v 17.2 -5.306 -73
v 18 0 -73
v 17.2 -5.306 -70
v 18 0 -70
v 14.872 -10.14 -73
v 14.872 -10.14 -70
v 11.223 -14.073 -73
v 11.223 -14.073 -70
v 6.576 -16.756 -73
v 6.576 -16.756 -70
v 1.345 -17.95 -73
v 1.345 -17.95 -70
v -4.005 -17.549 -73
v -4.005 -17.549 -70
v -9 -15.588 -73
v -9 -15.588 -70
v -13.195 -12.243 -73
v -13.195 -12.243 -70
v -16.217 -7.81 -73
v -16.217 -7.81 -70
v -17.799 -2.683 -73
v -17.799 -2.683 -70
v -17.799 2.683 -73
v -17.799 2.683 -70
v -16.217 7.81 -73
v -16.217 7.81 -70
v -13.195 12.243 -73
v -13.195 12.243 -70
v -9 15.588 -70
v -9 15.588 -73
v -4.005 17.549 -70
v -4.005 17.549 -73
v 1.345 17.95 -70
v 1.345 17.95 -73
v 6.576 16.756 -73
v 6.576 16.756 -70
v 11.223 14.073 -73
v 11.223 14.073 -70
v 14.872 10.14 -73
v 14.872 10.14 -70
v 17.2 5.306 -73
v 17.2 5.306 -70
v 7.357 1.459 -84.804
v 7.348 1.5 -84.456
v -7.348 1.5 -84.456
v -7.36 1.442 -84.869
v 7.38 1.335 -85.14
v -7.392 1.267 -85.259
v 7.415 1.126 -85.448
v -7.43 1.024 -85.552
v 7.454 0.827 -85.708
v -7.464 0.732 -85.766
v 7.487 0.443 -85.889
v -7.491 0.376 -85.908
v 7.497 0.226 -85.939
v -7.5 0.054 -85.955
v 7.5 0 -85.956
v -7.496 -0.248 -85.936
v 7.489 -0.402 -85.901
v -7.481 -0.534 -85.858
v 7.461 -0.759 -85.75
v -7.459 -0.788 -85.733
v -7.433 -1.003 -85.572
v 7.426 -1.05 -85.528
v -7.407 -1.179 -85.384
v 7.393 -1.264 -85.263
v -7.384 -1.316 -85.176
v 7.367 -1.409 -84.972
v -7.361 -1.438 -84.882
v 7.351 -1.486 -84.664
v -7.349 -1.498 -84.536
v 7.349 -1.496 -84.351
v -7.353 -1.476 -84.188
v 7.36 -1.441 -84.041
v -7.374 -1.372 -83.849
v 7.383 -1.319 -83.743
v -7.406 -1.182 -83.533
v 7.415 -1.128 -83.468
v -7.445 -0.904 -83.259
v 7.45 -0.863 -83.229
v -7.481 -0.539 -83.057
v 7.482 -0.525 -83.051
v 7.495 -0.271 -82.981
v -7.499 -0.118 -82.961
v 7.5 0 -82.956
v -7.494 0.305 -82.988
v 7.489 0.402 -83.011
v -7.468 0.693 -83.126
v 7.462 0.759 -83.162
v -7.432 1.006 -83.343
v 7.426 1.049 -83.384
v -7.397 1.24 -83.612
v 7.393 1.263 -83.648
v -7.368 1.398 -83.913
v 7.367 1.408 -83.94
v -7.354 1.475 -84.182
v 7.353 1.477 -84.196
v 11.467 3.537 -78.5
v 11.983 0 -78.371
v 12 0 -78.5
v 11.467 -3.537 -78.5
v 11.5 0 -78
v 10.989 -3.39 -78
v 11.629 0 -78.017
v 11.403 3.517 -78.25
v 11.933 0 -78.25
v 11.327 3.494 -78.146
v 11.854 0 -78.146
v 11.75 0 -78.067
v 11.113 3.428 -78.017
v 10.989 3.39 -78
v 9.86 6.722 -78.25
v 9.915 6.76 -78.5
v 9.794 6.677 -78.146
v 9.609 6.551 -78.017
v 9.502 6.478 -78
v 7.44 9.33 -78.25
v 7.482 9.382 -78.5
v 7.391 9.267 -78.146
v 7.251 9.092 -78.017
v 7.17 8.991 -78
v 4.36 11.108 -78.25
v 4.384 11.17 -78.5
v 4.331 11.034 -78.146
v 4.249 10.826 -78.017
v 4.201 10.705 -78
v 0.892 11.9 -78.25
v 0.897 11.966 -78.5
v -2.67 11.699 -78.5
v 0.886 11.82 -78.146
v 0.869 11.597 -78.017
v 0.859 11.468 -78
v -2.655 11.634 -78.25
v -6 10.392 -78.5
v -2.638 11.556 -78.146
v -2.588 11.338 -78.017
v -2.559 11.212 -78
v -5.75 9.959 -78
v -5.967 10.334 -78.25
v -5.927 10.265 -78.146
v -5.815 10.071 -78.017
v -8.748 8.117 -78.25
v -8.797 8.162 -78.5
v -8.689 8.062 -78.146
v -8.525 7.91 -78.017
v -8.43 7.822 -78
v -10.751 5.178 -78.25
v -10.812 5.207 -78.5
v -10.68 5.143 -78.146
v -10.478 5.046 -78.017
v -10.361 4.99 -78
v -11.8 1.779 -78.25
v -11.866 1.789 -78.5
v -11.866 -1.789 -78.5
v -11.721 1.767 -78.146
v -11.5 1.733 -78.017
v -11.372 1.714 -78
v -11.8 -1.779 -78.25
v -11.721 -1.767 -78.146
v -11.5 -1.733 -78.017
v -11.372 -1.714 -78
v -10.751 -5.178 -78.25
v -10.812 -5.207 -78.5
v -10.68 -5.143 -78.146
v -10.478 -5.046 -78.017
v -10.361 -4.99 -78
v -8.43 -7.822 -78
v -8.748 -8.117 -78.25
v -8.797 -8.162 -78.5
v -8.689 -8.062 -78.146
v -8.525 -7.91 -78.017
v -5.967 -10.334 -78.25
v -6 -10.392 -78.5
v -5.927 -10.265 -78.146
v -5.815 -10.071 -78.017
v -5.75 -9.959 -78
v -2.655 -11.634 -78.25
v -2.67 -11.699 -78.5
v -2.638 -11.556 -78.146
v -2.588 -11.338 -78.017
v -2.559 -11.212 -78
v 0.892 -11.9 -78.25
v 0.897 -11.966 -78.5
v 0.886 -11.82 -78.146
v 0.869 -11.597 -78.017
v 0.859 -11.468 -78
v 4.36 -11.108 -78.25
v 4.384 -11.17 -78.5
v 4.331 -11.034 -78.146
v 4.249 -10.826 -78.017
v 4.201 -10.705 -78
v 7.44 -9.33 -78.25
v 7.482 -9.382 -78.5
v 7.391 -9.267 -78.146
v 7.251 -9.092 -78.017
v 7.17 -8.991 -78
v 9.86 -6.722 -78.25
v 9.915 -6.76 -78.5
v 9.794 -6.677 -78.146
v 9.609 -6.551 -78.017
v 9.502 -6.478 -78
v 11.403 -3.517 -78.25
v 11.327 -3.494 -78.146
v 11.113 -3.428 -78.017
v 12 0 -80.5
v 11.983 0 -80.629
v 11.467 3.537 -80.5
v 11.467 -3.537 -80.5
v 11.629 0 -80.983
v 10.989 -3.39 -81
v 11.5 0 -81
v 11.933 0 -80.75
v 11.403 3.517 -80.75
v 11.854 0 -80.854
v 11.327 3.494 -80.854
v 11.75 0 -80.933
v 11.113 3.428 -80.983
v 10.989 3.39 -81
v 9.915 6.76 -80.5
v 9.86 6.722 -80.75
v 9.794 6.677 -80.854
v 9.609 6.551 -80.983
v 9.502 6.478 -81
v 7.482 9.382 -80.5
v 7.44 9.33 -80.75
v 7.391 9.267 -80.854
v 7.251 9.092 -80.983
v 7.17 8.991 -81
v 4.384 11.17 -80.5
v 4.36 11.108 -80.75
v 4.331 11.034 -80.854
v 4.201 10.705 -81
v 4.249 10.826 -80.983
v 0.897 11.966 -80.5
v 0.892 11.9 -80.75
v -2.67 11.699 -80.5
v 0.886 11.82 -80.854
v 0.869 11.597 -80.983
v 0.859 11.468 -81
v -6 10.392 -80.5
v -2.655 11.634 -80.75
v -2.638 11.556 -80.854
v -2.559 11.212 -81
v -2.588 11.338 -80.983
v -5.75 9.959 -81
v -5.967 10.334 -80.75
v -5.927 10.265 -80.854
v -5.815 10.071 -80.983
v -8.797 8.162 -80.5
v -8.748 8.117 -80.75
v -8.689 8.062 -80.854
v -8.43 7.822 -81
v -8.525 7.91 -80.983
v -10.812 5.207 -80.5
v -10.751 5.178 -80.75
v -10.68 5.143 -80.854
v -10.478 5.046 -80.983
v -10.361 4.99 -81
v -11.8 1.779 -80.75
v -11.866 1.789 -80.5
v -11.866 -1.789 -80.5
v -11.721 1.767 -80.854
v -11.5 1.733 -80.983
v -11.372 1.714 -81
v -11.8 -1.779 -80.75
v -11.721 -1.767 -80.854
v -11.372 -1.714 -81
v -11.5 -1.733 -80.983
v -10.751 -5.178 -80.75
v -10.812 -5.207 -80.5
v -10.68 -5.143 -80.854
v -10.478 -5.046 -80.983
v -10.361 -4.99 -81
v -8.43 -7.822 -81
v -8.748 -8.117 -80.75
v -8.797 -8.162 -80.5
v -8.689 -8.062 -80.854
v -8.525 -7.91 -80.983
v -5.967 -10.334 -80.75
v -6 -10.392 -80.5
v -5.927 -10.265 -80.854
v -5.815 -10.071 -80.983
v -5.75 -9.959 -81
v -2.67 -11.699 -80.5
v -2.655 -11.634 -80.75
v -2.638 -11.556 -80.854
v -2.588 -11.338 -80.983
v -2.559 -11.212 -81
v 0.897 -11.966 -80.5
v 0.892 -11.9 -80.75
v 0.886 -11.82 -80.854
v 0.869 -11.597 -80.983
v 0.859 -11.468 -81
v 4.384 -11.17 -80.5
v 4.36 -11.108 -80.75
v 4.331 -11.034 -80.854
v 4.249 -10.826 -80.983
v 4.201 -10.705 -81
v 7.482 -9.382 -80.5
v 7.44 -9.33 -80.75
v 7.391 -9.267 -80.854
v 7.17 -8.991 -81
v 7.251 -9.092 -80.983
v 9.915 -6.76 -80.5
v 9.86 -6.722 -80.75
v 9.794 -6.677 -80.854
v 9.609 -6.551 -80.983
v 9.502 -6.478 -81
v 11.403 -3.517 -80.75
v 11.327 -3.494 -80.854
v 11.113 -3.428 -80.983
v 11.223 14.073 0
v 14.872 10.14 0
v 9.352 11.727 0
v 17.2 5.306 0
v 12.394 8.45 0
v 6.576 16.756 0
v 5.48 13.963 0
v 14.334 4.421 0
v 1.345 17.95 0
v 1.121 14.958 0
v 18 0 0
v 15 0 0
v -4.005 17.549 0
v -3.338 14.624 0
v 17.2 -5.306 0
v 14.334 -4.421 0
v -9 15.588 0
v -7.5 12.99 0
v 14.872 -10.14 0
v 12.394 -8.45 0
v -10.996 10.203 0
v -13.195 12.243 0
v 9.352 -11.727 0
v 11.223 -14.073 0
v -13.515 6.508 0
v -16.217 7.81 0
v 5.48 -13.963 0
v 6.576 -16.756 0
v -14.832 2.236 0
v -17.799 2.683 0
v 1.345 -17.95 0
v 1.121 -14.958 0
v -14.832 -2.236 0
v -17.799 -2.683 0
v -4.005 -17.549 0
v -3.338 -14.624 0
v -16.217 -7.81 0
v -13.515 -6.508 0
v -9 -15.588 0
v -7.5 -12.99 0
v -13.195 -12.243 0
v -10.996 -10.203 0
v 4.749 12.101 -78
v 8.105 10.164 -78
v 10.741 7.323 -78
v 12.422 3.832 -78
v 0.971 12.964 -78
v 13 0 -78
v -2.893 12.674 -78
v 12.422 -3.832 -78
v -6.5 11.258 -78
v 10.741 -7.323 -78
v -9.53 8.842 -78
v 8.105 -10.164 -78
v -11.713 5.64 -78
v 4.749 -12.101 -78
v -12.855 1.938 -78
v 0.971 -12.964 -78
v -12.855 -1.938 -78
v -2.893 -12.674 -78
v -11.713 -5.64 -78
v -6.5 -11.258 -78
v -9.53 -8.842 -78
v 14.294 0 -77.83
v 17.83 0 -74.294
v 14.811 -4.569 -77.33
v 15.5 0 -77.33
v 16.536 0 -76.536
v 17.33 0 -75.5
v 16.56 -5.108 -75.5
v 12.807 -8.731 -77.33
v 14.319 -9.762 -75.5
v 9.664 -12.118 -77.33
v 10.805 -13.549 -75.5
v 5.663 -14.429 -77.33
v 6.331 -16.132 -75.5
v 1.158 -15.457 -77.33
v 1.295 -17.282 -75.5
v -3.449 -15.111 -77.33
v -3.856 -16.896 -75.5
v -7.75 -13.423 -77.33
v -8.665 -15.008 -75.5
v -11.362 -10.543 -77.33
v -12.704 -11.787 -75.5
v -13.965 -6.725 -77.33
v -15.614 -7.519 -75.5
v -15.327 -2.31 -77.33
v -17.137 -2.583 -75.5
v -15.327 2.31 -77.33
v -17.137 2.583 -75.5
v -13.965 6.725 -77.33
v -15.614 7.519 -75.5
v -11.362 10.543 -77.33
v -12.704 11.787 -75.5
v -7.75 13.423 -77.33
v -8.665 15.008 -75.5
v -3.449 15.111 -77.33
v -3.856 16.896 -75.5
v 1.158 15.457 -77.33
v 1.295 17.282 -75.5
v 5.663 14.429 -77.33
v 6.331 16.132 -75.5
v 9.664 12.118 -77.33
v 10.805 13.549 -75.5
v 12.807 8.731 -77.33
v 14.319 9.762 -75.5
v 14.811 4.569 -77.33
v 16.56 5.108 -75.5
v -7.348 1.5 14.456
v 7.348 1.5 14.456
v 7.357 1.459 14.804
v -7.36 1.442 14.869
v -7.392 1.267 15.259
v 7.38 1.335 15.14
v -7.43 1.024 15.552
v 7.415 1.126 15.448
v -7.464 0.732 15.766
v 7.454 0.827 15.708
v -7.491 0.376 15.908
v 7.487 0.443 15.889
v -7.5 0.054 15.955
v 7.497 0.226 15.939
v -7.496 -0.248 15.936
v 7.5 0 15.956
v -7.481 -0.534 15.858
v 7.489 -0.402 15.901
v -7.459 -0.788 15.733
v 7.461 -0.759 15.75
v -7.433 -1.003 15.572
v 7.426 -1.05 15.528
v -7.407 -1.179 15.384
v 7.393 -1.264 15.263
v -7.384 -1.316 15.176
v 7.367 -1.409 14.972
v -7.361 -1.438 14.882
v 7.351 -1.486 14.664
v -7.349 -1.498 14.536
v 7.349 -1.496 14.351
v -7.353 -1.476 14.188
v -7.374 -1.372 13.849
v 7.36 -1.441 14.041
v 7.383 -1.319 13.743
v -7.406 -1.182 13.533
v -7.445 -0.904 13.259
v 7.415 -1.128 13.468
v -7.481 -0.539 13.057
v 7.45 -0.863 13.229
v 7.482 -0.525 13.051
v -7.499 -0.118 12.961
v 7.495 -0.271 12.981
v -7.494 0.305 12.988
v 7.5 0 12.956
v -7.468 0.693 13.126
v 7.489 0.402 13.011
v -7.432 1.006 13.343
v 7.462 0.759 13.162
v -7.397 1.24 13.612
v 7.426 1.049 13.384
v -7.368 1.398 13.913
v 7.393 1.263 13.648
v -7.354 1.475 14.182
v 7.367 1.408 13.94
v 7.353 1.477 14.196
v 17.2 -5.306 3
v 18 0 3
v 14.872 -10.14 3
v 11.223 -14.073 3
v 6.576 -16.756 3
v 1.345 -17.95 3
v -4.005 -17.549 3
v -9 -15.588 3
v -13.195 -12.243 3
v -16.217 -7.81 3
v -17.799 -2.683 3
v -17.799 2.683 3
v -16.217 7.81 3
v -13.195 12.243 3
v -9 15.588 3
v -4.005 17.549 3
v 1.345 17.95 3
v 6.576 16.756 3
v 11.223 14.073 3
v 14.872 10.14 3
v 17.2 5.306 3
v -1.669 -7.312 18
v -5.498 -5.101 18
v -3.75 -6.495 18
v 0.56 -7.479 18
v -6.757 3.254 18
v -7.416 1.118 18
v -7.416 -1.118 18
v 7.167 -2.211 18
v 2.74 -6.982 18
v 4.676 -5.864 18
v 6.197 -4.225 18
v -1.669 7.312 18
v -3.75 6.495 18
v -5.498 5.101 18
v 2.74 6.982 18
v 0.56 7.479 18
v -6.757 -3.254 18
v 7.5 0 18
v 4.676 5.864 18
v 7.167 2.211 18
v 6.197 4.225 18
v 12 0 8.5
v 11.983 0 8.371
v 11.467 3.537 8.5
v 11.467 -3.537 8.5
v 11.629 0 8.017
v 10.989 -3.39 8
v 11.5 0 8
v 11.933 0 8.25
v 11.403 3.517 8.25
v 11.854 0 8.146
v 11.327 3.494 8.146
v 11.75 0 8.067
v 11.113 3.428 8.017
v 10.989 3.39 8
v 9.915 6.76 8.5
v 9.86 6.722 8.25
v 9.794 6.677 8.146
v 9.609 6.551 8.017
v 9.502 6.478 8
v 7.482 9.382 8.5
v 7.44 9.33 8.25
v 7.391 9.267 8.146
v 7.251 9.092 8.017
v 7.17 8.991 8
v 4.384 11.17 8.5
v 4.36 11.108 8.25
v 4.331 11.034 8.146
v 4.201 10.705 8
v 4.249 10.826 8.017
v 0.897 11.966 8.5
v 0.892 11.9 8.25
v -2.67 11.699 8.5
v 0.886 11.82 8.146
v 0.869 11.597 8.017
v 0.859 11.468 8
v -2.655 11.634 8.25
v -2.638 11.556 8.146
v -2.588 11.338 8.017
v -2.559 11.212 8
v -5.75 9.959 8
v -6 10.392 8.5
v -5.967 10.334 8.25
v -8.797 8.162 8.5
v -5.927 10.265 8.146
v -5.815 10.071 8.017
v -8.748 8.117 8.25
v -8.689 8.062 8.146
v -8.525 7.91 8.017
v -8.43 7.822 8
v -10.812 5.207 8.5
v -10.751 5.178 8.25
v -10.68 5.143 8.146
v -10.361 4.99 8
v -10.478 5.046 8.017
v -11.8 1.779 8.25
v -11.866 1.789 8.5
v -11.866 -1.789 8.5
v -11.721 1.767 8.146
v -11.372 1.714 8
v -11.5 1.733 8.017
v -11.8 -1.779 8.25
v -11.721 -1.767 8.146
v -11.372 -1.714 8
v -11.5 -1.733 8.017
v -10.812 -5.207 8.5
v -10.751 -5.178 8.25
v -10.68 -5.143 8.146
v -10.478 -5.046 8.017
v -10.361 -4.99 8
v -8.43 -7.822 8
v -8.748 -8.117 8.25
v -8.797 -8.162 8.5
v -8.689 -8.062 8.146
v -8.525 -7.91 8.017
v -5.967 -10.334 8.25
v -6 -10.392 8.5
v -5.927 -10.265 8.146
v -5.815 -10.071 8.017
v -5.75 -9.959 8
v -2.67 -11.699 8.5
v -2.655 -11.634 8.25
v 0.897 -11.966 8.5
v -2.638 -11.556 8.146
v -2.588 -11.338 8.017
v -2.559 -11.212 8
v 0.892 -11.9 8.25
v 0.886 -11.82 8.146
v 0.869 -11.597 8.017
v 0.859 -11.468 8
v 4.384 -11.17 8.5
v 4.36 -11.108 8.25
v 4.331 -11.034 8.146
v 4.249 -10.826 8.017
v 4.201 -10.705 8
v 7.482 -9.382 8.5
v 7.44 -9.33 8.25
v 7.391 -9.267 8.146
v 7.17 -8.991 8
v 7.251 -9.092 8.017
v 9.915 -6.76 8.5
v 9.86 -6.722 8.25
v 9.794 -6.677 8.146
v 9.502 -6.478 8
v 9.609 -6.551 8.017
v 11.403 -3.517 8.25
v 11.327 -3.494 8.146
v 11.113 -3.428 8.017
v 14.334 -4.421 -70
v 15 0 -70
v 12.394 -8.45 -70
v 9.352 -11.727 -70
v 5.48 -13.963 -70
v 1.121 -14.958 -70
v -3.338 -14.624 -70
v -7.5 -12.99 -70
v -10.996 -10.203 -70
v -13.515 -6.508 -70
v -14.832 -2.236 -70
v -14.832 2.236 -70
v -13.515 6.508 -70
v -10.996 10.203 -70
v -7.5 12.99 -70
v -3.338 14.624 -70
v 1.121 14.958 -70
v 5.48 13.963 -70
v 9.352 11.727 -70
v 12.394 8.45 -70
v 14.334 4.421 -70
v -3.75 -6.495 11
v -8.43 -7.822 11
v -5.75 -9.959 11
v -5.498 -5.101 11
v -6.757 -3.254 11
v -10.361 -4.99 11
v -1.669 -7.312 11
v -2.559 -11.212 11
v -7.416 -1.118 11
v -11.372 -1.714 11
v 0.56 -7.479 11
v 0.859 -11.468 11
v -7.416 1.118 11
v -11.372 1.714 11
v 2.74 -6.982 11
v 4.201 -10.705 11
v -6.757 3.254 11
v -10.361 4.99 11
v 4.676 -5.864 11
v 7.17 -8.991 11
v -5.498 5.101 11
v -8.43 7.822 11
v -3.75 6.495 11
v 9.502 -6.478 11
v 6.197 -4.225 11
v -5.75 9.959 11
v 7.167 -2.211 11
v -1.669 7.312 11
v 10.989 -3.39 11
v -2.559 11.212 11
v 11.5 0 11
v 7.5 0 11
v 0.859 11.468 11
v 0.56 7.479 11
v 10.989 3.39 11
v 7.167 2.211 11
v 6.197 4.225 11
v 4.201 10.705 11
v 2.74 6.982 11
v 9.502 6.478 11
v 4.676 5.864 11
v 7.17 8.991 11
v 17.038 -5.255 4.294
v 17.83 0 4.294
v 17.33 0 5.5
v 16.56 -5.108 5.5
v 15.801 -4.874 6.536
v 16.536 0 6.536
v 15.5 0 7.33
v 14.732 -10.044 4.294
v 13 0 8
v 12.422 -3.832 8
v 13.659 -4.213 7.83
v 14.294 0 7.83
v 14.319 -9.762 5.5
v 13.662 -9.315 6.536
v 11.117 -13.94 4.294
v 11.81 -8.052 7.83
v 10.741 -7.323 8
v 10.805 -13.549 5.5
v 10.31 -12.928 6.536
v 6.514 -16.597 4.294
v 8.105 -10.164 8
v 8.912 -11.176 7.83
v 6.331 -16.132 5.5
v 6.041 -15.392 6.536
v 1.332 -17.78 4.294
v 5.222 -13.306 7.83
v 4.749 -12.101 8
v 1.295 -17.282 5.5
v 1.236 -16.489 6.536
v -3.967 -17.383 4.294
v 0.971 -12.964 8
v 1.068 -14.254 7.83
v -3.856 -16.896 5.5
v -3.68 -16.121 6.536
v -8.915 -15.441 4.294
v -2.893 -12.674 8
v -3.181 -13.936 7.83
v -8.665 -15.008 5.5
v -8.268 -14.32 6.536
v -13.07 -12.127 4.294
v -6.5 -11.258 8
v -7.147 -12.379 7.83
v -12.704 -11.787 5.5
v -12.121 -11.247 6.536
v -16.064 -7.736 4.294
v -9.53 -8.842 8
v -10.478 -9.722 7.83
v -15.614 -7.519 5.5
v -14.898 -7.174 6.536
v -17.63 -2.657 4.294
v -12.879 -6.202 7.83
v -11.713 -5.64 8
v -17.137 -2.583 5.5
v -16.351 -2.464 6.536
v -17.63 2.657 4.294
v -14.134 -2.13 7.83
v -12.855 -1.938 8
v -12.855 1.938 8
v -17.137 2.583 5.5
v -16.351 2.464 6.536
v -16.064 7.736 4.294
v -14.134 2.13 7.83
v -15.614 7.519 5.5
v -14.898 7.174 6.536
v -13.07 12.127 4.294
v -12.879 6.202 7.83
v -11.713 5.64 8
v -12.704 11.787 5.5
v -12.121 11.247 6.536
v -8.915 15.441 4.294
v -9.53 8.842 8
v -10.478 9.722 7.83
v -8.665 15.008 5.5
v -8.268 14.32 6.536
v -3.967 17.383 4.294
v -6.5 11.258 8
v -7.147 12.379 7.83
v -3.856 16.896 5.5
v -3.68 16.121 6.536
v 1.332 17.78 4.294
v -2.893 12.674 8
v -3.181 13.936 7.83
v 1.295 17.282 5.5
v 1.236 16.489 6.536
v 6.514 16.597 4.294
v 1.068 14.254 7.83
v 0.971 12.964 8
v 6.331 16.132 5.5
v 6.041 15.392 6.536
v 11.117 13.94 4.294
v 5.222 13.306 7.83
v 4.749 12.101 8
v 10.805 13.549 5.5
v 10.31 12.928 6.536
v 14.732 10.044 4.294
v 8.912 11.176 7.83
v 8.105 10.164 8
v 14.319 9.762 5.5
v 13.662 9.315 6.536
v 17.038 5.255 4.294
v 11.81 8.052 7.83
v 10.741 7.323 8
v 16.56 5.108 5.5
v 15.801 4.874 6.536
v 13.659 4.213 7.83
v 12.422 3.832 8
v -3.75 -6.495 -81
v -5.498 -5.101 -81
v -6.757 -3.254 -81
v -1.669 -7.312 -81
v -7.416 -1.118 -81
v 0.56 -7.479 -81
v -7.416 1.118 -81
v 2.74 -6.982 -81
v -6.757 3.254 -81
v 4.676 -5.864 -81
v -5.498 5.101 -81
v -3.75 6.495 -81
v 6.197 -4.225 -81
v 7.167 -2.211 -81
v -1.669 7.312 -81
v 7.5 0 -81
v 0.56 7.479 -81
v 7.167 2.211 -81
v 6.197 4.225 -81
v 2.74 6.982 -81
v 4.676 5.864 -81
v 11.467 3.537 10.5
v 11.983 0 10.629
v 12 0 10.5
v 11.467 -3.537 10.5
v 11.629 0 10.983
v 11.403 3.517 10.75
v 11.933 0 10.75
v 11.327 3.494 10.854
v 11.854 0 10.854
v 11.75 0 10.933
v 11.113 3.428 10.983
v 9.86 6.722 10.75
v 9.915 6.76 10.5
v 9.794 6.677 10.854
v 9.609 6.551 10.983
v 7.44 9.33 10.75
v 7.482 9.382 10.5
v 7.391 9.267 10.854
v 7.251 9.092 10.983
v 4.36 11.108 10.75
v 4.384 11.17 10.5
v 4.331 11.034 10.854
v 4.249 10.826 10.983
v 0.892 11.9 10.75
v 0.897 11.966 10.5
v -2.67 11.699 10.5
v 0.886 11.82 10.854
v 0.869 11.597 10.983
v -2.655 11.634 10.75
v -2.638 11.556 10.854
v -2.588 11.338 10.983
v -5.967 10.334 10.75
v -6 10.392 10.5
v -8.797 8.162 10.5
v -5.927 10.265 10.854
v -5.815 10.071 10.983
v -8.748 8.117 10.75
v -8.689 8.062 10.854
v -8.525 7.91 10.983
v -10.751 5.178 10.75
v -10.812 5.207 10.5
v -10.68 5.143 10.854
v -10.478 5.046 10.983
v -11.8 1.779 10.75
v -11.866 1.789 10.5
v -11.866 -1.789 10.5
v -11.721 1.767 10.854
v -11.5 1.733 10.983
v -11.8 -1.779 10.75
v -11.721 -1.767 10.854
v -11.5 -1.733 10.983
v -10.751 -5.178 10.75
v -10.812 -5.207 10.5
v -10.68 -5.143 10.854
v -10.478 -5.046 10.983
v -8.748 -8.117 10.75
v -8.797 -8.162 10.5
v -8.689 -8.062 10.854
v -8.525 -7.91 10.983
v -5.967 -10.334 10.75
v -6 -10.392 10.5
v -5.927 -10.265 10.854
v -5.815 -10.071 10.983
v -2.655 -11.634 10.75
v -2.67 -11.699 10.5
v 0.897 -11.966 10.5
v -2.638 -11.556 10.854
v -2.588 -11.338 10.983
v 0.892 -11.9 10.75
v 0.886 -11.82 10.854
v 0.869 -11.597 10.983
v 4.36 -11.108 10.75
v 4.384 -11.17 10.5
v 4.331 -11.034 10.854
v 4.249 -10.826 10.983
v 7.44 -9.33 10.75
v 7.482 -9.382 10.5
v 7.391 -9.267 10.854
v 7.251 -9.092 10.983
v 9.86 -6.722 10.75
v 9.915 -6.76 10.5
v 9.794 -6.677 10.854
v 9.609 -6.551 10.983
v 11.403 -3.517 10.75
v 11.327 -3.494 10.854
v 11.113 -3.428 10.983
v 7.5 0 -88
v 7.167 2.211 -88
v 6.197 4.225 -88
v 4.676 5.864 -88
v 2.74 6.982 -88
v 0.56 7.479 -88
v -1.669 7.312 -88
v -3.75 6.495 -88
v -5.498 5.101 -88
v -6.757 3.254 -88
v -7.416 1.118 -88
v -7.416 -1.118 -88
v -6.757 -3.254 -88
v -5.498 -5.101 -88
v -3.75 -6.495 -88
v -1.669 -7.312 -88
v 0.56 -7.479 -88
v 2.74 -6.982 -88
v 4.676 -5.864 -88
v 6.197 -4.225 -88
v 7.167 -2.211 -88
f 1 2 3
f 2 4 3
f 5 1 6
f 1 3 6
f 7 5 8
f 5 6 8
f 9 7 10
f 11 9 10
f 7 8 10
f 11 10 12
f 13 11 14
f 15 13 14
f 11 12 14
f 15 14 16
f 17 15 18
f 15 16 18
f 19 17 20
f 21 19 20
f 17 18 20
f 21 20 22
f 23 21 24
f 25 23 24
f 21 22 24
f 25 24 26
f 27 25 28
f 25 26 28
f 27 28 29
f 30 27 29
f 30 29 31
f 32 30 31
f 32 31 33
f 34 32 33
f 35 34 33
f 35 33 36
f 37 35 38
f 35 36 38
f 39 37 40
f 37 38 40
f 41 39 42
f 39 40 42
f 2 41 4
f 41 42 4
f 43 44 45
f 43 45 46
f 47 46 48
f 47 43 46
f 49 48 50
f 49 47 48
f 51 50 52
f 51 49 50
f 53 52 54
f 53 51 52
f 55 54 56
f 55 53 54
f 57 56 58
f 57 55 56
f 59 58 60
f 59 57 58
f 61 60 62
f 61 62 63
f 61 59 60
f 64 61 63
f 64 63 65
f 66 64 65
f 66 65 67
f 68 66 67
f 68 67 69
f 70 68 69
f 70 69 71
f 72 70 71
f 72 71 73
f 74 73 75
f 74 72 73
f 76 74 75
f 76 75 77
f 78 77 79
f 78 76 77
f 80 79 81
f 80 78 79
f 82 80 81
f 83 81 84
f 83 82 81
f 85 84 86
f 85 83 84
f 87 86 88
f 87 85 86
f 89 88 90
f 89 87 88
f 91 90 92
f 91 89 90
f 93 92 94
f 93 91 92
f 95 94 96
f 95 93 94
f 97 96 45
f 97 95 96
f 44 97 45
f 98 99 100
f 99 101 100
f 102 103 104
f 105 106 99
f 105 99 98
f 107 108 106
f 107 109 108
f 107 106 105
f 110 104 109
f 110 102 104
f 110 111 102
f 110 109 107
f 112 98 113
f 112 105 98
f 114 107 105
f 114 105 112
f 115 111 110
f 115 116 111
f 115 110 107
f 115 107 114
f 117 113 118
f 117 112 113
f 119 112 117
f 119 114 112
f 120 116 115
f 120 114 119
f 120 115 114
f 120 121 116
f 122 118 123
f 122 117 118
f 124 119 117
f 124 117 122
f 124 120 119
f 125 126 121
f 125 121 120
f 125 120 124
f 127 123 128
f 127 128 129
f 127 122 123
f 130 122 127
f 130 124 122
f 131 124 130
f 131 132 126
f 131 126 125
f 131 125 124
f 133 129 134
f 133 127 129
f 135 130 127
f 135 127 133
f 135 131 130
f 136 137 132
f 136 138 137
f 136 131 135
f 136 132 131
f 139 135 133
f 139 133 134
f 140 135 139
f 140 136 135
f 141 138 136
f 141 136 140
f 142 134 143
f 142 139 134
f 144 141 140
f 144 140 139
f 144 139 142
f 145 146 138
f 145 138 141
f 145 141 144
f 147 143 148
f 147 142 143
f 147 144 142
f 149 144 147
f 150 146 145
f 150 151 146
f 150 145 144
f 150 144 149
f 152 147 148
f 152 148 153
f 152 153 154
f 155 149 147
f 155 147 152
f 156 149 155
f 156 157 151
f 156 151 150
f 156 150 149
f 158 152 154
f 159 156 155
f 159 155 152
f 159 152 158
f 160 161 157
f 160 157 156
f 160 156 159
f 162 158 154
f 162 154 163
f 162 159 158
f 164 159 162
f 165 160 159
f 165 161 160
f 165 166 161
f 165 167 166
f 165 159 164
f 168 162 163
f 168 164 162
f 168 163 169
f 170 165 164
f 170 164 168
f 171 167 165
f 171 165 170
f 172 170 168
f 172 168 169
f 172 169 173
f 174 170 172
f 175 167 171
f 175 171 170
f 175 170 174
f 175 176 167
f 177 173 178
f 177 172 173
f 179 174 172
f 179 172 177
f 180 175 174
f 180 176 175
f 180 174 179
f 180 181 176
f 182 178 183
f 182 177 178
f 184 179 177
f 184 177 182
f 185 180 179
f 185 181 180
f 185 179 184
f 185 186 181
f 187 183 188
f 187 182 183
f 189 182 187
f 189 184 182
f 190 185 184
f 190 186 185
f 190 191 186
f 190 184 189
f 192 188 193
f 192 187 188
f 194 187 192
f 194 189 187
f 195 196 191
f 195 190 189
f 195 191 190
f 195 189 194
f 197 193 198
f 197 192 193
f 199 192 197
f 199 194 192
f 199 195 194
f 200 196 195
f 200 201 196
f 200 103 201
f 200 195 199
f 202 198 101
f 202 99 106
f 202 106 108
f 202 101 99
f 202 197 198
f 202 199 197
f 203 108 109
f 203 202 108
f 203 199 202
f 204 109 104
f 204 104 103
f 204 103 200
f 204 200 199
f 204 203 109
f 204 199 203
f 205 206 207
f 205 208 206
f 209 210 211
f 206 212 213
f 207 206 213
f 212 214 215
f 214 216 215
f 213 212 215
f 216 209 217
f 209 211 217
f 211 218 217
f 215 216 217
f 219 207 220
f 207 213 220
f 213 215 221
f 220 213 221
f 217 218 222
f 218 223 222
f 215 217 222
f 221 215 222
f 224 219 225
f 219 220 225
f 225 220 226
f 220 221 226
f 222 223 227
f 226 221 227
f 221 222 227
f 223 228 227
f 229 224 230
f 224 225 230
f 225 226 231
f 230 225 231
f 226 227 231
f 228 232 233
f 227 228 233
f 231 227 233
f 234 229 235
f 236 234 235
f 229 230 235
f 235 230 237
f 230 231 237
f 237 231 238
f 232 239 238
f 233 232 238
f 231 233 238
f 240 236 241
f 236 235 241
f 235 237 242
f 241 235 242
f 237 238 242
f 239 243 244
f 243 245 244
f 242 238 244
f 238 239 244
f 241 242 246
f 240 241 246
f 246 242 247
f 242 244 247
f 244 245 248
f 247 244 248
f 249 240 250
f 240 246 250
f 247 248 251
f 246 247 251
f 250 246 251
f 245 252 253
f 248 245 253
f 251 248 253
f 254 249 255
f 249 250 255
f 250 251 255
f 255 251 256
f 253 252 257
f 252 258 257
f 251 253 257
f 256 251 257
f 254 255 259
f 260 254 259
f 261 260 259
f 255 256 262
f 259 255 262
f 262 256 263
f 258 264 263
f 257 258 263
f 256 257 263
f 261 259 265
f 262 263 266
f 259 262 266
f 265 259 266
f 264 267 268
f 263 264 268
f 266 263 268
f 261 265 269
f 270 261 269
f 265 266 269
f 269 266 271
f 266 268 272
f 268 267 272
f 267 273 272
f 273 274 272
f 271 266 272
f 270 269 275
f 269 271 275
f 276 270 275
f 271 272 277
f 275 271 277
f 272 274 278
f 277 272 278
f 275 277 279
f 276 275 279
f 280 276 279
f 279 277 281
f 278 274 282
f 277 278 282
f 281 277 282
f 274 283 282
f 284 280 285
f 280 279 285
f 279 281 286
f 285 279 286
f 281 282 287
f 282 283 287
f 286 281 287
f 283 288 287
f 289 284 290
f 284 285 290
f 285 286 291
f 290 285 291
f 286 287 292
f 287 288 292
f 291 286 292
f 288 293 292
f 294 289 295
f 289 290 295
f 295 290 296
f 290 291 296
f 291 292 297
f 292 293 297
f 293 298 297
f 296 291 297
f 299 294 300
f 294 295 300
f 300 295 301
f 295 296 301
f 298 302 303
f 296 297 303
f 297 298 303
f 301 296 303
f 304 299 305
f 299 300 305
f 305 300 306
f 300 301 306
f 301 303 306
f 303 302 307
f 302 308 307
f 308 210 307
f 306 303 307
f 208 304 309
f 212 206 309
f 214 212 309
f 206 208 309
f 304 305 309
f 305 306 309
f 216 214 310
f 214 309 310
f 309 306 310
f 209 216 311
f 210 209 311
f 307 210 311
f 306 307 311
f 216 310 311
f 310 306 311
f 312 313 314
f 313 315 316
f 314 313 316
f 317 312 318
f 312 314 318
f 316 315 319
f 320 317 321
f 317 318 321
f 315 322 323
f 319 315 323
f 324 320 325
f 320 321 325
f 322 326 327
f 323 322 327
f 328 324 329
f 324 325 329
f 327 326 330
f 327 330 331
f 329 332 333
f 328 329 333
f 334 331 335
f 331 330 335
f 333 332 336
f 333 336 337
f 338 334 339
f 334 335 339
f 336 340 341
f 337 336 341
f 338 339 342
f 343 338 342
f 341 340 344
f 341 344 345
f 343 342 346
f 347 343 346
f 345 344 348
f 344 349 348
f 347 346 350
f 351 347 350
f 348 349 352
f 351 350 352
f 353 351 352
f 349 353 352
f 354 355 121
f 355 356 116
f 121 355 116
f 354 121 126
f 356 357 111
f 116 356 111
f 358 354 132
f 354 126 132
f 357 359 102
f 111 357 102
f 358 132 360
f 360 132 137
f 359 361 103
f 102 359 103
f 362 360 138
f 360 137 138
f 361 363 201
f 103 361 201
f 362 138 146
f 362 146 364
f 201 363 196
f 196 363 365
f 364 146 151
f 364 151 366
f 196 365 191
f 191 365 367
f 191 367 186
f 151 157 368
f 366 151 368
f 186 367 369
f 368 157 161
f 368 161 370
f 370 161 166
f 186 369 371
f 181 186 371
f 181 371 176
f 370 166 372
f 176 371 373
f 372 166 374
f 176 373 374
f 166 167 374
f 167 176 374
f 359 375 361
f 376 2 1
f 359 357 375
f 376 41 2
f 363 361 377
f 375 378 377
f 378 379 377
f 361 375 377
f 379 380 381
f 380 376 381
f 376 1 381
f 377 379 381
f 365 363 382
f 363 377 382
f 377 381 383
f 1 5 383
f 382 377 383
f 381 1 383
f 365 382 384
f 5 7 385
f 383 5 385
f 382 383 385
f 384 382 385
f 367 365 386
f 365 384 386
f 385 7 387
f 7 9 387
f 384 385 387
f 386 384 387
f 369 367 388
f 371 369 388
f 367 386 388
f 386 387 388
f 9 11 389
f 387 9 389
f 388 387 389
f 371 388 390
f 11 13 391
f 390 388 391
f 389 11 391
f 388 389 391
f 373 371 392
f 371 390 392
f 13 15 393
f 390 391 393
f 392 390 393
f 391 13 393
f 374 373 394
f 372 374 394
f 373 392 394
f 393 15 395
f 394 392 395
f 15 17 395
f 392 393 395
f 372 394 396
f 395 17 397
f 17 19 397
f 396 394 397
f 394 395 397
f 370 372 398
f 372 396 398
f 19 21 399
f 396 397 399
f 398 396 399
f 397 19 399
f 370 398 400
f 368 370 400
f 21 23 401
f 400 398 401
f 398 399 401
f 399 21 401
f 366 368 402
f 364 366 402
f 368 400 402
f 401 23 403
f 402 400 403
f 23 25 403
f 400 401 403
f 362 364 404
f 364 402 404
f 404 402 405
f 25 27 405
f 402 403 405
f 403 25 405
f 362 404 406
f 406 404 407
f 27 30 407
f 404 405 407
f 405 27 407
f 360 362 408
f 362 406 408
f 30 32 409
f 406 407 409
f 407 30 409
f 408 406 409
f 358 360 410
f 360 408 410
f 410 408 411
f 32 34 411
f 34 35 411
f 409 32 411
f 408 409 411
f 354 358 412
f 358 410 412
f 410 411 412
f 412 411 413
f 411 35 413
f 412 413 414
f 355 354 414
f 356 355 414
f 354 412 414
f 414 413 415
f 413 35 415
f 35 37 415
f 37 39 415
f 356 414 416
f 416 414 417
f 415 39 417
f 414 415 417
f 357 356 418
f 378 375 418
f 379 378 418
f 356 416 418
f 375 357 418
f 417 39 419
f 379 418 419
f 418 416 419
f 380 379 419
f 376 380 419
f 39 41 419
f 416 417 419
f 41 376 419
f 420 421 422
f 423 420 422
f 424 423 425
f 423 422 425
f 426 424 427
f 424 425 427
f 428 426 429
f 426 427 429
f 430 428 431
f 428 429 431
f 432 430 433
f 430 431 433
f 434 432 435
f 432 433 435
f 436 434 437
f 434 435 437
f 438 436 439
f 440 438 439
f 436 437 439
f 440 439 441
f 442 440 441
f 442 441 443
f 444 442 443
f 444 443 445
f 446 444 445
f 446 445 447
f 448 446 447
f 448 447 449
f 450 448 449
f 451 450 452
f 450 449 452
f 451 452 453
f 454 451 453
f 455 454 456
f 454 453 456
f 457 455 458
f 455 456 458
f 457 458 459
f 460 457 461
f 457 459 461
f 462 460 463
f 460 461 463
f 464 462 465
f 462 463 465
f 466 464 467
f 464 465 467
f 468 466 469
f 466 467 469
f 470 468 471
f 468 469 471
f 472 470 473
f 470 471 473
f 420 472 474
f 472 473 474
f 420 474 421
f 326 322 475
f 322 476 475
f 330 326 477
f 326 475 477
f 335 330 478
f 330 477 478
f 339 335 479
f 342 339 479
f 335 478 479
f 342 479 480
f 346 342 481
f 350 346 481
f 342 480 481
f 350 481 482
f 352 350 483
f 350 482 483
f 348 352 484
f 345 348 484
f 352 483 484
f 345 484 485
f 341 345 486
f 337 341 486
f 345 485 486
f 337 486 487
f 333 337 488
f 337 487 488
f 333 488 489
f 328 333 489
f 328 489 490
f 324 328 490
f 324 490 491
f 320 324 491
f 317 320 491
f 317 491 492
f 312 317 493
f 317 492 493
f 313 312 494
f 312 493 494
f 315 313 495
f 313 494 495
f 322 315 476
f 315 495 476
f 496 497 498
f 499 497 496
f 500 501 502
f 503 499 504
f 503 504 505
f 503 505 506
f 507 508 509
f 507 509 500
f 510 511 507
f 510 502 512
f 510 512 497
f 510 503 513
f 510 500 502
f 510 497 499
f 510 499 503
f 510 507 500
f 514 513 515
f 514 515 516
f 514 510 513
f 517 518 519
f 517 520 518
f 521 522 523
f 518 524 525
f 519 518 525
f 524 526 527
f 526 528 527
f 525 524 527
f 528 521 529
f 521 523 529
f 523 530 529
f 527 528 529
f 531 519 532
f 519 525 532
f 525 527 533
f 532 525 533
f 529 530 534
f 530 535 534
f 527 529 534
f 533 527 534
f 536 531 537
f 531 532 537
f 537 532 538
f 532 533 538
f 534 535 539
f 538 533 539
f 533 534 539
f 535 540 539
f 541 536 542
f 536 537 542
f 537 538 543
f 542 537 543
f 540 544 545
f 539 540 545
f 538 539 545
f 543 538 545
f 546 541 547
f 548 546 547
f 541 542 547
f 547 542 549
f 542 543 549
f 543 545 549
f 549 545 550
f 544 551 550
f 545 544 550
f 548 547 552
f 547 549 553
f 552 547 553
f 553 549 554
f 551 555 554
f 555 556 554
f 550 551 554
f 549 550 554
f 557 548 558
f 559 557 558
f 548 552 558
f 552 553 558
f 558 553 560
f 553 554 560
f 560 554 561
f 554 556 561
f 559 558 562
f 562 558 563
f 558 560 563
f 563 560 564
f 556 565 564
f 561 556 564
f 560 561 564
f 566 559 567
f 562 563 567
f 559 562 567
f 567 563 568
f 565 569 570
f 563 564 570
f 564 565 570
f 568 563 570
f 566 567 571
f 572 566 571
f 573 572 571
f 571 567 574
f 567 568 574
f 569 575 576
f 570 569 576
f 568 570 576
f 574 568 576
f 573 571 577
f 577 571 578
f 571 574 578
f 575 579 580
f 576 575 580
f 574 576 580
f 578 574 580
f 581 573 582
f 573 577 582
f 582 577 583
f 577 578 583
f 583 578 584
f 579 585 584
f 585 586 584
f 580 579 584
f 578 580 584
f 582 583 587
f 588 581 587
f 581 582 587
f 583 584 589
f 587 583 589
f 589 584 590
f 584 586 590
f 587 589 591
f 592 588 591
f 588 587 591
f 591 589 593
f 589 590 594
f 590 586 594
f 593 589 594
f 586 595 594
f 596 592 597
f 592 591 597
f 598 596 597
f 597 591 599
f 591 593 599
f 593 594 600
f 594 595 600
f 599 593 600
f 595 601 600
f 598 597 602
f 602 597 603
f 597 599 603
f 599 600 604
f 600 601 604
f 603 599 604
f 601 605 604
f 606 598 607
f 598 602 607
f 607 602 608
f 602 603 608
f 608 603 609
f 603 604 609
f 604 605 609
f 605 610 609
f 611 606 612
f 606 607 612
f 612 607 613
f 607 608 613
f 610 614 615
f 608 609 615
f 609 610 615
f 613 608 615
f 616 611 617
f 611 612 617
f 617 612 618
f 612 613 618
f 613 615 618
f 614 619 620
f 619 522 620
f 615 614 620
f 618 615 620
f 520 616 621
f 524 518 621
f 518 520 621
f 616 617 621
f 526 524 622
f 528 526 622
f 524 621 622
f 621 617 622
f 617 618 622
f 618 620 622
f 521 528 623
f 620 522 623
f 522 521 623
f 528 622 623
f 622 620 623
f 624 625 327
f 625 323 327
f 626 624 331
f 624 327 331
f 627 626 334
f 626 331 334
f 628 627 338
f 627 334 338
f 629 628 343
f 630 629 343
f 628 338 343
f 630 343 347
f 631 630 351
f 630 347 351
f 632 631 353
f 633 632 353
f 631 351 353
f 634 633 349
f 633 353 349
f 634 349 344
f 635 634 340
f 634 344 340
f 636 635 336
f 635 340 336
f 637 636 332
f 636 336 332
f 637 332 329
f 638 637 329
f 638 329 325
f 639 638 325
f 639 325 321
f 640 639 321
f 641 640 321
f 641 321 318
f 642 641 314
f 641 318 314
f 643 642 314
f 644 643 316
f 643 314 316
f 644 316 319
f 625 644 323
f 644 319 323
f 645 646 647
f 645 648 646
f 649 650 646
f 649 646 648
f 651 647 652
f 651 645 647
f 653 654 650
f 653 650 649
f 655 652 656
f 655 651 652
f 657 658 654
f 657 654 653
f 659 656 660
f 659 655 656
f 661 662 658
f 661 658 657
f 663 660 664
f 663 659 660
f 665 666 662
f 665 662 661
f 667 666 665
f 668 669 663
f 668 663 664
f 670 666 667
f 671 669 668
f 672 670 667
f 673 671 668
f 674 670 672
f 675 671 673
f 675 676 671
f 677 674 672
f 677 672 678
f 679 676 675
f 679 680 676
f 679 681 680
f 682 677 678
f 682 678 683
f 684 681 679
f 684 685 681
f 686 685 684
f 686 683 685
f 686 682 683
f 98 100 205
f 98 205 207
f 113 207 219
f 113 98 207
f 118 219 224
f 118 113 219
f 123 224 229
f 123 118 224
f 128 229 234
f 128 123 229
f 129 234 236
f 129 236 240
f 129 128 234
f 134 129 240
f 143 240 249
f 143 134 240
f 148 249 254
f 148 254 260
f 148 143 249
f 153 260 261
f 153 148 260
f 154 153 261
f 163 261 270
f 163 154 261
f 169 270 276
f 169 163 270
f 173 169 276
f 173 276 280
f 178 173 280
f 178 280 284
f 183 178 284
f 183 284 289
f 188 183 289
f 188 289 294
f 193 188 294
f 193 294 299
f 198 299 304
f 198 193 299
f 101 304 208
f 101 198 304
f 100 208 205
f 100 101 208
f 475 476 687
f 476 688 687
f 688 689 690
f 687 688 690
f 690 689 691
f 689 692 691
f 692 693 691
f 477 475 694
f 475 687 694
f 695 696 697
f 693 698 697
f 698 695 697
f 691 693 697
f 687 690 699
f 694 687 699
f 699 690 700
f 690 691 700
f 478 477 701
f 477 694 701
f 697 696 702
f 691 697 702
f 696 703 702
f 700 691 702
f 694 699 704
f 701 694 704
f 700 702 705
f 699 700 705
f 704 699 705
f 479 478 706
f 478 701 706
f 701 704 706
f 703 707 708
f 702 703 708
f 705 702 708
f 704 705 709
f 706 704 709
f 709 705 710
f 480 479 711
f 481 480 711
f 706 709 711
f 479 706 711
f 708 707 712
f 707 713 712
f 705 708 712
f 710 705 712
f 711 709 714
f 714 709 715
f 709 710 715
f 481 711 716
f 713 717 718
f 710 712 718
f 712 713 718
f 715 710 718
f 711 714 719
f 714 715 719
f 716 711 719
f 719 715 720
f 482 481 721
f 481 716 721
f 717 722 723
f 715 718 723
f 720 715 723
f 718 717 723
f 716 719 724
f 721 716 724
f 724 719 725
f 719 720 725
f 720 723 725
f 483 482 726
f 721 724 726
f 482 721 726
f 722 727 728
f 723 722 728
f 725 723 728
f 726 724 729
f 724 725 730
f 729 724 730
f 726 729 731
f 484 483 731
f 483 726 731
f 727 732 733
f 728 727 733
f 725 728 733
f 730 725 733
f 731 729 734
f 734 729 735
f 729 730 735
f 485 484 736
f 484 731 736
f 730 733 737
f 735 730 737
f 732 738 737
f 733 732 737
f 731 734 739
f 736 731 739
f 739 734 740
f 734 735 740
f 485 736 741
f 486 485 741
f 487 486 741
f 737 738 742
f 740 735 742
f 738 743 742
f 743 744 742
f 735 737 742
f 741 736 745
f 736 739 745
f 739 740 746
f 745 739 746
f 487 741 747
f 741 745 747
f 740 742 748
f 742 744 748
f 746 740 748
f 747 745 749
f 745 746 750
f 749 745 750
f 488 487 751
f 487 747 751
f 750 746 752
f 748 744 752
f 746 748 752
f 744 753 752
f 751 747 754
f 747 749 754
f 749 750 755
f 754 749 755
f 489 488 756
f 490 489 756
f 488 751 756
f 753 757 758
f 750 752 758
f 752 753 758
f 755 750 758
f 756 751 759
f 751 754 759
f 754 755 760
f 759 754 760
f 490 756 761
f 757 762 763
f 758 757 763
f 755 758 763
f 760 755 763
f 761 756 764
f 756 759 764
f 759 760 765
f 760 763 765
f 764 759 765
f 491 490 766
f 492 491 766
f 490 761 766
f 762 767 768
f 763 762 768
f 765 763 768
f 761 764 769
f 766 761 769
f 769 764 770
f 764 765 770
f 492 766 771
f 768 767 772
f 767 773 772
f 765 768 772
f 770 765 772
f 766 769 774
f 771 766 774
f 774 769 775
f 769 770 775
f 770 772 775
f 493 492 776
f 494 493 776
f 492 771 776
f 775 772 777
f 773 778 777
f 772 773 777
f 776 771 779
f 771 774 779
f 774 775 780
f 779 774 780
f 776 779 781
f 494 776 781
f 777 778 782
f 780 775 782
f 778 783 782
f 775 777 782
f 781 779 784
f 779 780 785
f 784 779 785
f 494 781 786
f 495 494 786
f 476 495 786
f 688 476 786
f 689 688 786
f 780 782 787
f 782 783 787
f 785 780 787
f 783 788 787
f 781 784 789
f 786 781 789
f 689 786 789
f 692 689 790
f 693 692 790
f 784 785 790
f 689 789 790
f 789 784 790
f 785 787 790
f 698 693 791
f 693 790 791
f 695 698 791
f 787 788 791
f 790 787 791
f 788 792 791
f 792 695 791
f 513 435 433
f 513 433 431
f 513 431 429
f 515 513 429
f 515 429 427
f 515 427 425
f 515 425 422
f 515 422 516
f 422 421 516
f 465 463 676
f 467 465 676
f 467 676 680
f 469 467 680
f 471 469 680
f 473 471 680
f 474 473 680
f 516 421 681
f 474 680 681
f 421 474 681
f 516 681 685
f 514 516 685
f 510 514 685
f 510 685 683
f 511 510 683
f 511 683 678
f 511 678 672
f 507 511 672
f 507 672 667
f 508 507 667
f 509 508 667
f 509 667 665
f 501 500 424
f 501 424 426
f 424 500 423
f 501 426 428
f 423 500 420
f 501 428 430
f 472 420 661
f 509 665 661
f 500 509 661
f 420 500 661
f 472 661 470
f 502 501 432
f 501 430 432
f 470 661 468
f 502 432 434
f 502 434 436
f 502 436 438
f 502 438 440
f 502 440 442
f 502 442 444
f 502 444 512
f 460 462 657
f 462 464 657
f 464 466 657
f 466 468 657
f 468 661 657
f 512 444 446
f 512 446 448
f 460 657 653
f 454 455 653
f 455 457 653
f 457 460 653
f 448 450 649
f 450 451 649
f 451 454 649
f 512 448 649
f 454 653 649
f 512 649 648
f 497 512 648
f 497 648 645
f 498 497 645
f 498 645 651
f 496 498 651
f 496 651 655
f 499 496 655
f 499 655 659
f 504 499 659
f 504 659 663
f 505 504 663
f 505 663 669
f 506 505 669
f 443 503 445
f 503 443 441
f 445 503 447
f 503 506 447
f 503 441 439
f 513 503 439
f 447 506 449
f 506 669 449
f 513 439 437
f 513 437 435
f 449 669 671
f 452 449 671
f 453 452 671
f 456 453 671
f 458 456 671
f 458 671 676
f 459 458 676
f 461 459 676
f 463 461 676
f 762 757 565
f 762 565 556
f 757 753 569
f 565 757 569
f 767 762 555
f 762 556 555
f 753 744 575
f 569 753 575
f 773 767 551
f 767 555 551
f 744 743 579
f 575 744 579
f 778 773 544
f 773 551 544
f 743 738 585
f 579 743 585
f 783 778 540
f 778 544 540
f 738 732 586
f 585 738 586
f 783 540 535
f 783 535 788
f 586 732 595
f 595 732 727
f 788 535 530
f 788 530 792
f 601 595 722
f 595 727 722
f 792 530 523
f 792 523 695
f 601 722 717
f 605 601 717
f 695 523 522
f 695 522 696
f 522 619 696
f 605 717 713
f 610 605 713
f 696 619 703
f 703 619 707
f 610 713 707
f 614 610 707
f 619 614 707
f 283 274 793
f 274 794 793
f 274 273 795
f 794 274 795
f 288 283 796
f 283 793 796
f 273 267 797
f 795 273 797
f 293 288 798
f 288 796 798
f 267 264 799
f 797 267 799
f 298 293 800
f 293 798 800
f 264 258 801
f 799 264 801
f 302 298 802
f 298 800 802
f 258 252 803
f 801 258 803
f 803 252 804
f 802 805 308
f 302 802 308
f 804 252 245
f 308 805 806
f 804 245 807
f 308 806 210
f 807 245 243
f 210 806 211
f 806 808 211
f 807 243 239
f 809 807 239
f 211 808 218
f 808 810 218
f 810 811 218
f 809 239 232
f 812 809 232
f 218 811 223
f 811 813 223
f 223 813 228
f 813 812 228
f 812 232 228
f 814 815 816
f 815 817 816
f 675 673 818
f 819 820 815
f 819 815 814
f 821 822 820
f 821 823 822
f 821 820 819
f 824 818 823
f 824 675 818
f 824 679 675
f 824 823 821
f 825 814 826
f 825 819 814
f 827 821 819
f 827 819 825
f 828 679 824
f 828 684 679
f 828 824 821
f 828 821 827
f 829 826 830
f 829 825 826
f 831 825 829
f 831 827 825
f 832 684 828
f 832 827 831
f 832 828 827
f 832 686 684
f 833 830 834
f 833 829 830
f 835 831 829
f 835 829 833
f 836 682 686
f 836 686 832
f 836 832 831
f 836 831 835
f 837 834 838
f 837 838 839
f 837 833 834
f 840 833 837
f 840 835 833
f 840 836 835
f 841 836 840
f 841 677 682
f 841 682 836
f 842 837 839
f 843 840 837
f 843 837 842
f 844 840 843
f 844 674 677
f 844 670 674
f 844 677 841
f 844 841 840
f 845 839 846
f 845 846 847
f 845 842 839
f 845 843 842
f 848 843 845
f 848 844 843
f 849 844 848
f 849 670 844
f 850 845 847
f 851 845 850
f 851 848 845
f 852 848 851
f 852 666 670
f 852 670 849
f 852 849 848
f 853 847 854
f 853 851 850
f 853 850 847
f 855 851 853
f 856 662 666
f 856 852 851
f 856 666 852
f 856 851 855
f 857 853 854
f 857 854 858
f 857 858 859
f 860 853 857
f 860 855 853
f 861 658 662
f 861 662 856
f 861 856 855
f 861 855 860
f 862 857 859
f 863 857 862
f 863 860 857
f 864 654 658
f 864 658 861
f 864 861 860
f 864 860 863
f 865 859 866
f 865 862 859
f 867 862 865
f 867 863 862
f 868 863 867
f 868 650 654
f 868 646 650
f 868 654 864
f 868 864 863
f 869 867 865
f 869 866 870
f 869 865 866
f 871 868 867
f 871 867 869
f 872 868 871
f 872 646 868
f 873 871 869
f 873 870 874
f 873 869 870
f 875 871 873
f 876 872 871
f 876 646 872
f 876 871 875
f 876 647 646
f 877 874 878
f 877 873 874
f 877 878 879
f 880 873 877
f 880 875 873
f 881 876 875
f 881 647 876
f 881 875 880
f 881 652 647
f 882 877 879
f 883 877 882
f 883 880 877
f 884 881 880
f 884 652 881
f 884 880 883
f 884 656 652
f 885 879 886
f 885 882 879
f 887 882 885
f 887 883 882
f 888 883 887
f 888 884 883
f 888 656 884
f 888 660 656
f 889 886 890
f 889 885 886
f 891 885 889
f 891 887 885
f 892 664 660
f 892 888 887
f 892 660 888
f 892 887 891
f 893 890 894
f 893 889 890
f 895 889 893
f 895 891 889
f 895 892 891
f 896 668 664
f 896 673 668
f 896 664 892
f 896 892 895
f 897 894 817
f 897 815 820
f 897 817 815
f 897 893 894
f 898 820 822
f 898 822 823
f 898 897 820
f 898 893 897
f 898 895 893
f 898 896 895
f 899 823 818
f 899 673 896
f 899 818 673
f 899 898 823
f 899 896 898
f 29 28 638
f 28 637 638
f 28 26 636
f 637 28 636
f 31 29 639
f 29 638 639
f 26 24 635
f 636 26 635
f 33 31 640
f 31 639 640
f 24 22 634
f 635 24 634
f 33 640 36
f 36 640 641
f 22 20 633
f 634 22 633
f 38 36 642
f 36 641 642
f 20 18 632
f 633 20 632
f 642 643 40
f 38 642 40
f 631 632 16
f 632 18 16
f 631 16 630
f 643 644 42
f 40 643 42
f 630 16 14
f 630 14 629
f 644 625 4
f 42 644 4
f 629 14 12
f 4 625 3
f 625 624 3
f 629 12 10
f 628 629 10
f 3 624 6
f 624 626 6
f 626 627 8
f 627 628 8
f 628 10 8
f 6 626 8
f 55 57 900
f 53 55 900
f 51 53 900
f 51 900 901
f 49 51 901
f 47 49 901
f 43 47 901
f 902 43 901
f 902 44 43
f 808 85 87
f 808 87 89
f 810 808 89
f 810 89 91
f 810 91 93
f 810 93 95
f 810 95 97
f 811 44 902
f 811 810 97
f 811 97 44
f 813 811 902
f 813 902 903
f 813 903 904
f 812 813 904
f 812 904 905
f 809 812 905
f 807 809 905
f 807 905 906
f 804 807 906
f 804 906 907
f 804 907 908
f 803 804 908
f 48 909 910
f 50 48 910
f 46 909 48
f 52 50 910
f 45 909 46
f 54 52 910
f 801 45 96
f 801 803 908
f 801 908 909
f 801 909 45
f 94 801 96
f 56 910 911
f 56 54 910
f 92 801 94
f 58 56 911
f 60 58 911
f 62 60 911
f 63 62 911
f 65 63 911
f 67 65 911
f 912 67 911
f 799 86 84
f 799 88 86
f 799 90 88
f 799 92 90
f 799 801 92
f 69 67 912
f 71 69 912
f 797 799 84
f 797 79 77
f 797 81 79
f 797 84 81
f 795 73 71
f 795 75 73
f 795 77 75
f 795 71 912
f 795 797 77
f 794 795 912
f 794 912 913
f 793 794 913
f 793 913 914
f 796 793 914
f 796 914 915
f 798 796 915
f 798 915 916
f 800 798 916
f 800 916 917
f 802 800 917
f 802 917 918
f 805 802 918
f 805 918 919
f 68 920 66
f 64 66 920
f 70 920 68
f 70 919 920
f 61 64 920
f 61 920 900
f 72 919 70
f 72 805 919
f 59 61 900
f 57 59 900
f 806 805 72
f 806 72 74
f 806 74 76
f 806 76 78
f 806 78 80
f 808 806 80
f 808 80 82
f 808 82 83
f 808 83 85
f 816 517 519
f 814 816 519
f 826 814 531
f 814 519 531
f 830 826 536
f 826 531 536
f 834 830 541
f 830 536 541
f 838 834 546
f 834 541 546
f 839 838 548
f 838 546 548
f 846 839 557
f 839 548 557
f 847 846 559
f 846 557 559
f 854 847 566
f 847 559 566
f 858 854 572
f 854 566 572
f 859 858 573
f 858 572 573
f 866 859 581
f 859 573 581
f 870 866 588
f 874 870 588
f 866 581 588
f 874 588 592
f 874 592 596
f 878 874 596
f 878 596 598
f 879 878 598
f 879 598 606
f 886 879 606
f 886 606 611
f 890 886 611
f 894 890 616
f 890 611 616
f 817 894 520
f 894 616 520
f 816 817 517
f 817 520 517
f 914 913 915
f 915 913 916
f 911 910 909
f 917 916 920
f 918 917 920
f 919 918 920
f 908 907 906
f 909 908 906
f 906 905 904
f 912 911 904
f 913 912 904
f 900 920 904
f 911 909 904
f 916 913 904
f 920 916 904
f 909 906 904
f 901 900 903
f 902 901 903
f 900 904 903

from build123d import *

# Parameters (mm, degrees)
F0_W     = 15
F0_H     = 70
F2_R     = 12
F2_R_2   = 7.5
F3_DEPTH = 3
F4_R     = 0.5
F5_R     = 0.5
F6_DEPTH = 10
F8_R     = 1.5
F9_DEPTH = 58.001


with BuildPart() as f1:
    # F0 (on Front) → F1 (revolve)
    with BuildSketch(Plane.XZ):
        with BuildLine():
            Line((15, -70), (0, -70))
            Line((0, -70), (0, -78))
            Line((0, -78), (13, -78))
            ThreePointArc((13, -78), (16.5355339059, -76.5355339059), (18, -73))
            Line((18, -73), (18, -70))
            Line((18, -70), (15, -70))
        make_face()
        with Locations((7.5, -35)):
            Rectangle(F0_W, F0_H)
        with BuildLine():
            Line((0, 8), (0, 0))
            Line((0, 0), (15, 0))
            Line((15, 0), (18, 0))
            Line((18, 0), (18, 3))
            ThreePointArc((18, 3), (16.5355339059, 6.5355339059), (13, 8))
            Line((13, 8), (0, 8))
        make_face()
    revolve(axis=Axis((0, 0, -35), (0, 0, -1)))



with BuildPart() as f3:
    # F2 (on face) → F3 (new body)
    with BuildSketch(Plane.XY.offset(8)):
        Circle(F2_R)
        Circle(F2_R_2, mode=Mode.SUBTRACT)
    extrude(amount=F3_DEPTH)

    # F4
    f4_edges = [f3.edges().sort_by_distance(p)[0] for p in [
        (-12, 0, 11),
    ]]
    fillet(f4_edges, radius=F4_R)

    # F5
    f5_edges = [f3.edges().sort_by_distance(p)[0] for p in [
        (-12, 0, 8),
    ]]
    fillet(f5_edges, radius=F5_R)


with BuildPart() as f6:
    # F2 (on face) → F6 (new body)
    with BuildSketch(Plane.XY.offset(8)):
        Circle(F2_R_2)
    extrude(amount=F6_DEPTH)

    # F8 (on offset) → F9 (cut, through all)
    with BuildSketch(Plane.YZ.offset(40)):
        with Locations((0, 14.4562739879)):
            Circle(F8_R)
    extrude(amount=-F9_DEPTH, mode=Mode.SUBTRACT)


with BuildPart() as f1_1:
    add(f1.part)

    add(f3.part)  # F11 merges F3

    add(f6.part)  # F11 merges F6
    # F11: F3, F6 across plane
    add(f3.part.mirror(Plane.XY.offset(-35)))
    add(f6.part.mirror(Plane.XY.offset(-35)))


solid = f1_1.part
